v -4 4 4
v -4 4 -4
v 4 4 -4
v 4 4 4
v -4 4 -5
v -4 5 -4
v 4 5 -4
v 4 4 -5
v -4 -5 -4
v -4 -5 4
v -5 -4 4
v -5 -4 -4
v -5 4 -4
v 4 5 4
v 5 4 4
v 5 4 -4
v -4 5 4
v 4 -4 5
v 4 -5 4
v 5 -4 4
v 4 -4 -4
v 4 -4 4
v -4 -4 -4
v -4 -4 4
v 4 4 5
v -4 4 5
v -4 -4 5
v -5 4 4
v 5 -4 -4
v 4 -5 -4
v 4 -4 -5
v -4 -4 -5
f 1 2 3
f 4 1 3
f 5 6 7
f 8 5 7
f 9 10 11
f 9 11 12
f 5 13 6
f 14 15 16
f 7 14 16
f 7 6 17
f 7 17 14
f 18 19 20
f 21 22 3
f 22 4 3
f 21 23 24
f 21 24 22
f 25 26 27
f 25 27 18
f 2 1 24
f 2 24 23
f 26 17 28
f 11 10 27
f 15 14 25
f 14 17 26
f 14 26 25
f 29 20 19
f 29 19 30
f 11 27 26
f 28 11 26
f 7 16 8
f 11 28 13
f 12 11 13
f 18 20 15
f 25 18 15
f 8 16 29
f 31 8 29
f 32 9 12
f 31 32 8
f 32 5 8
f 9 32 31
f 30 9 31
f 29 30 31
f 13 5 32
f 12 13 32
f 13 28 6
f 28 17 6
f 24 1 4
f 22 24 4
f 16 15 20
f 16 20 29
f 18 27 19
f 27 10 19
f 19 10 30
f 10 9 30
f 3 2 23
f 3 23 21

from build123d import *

# Parameters (mm, degrees)
ESBO_O1_W                = 10
ESBO_O1_H                = 10
RESSALTO_EXTRUS_O1_DEPTH = 5
CASCA2_T                 = 1
CHANFRO1_SIZE            = 1


with BuildPart() as part:
    # Esboço1 → Ressalto-extrusão1 (new, symmetric)
    with BuildSketch(Plane(origin=(0, 0, 0), x_dir=(1, 0, 0), z_dir=(0, 1, 0))):
        Rectangle(ESBO_O1_W, ESBO_O1_H)
    extrude(amount=RESSALTO_EXTRUS_O1_DEPTH, both=True)

    # Casca2 (no face opened: a closed hollow body)
    add(offset(amount=-CASCA2_T, mode=Mode.PRIVATE), mode=Mode.SUBTRACT)

    # Chanfro1
    chanfro1_edges = [part.edges().sort_by_distance(p)[0] for p in [
        (-5, 5, 0),
        (0, 5, 5),
        (5, 5, 0),
        (0, -5, 5),
        (-5, -5, 0),
        (0, -5, -5),
        (5, -5, 0),
        (5, 0, 5),
        (-5, 0, 5),
        (-5, 0, -5),
        (5, 0, -5),
        (0, 5, -5),
    ]]
    chamfer(chanfro1_edges, length=CHANFRO1_SIZE)


solid = part.part
